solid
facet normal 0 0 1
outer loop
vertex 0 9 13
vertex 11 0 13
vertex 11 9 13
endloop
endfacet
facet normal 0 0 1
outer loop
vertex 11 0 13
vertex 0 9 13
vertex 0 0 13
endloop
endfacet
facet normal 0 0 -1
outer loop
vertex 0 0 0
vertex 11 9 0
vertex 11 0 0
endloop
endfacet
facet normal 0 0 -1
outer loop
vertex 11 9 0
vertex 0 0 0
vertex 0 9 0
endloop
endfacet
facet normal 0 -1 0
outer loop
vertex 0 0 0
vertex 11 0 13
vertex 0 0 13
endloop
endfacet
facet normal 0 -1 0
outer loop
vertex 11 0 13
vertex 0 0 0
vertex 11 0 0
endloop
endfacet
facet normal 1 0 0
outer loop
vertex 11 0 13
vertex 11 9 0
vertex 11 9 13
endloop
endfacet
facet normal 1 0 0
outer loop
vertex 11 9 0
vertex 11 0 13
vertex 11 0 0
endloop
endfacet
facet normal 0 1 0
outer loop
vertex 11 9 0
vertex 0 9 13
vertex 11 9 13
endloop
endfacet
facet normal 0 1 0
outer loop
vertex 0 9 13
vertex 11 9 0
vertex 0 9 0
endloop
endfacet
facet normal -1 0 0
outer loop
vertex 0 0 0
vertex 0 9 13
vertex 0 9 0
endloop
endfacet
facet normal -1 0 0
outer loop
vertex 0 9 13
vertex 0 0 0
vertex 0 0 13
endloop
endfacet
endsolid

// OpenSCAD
// Generated by SolidPython 1.0.1 on 2020-07-29 00:46:55


cube(size = [11, 9, 13]);
/***********************************************
*********      SolidPython code:      **********
************************************************
 
# import packages: SolidPython
from solid import *
from solid.utils import *
from itertools import chain, combinations, permutations


class Resize:

    def __init__(self, scad_file):
        self.scad_file = scad_file
        #self.scad_file = import_scad(scad_file)
        # cone/cylinder param:
        self.r1 = 0
        self.r2 = 0
        self.h = 0
        # rectangular prism param:
        self.w = 0
        self.l = 0
        # ellipse param:
        self.r = 0

    # import OpenScad code (file name corresponds to shape)


    # classify shape + parameters
    def assign(self, param1, param2, param3):
        if self.scad_file == 'cone.scad':
            self.r1 = param1
            self.r2 = param2
            self.h = param3
        elif self.scad_file == 'cylinder.scad':
            self.r1 = param1
            self.r2 = param2
            self.h = param3
        elif self.scad_file == 'rectangularPrism.scad':
            self.h = param1
            self.l = param2
            self.w = param3
        else:
            self.r = param1
            self.h = param2

    # resize parameters
    def iterate(self):
        x = range(3, 20, 2)
        i = 1
        if self.scad_file == 'cone.scad':
            tempList = list(permutations(x, 2))
            for temp in tempList:
                param1 = temp[0]
                param2 = temp[1]
                filepath = 'produced_scad_files/' + 'cone' + str(param1) + '_' + str(param2) + '_' + '.scad'
                scad_render_to_file(cylinder(h=param1, r1=param2, r2=0), filepath)

        elif self.scad_file == 'cylinder.scad':
            tempList = list(permutations(x, 3))
            for temp in tempList:
                param1 = temp[0]
                param2 = temp[1]
                filepath = 'produced_scad_files/' + 'cylinder' + str(param1) + '_' + str(param2) + '_' + '.scad'
                scad_render_to_file(cylinder(h=param1, r1=param2, r2=param2), filepath)

        elif self.scad_file == 'rectangularPrism.scad':
            tempList = list(permutations(x, 3))
            for temp in tempList:
                param1 = temp[0]
                param2 = temp[1]
                param3 = temp[2]
                filepath = 'produced_scad_files/' + 'rectangularPrism' + str(param1) + '_' + str(param2) + '_' + str(
                    param3) + '.scad'
                scad_render_to_file(cube(size=(param1, param2, param3)), filepath)

        elif self.scad_file == 'ellipse.scad':
            tempList = list(permutations(x, 4))
            for temp in tempList:
                param1 = temp[0]
                param2 = temp[1]
                param3 = temp[2]
                param4 = temp[3]
                filepath = 'produced_scad_files/' + 'ellipse' + str(param1) + '_' + str(param2) + '_' + str(param3) + '_' + str(param4) + '.scad'
                scad_render_to_file(scale([param1, param2, param3])(sphere(r=param4)), filepath)

    def render_to_scadfile(self):
        scad_render_to_file(scad, 'example.scad') 
 
************************************************/
